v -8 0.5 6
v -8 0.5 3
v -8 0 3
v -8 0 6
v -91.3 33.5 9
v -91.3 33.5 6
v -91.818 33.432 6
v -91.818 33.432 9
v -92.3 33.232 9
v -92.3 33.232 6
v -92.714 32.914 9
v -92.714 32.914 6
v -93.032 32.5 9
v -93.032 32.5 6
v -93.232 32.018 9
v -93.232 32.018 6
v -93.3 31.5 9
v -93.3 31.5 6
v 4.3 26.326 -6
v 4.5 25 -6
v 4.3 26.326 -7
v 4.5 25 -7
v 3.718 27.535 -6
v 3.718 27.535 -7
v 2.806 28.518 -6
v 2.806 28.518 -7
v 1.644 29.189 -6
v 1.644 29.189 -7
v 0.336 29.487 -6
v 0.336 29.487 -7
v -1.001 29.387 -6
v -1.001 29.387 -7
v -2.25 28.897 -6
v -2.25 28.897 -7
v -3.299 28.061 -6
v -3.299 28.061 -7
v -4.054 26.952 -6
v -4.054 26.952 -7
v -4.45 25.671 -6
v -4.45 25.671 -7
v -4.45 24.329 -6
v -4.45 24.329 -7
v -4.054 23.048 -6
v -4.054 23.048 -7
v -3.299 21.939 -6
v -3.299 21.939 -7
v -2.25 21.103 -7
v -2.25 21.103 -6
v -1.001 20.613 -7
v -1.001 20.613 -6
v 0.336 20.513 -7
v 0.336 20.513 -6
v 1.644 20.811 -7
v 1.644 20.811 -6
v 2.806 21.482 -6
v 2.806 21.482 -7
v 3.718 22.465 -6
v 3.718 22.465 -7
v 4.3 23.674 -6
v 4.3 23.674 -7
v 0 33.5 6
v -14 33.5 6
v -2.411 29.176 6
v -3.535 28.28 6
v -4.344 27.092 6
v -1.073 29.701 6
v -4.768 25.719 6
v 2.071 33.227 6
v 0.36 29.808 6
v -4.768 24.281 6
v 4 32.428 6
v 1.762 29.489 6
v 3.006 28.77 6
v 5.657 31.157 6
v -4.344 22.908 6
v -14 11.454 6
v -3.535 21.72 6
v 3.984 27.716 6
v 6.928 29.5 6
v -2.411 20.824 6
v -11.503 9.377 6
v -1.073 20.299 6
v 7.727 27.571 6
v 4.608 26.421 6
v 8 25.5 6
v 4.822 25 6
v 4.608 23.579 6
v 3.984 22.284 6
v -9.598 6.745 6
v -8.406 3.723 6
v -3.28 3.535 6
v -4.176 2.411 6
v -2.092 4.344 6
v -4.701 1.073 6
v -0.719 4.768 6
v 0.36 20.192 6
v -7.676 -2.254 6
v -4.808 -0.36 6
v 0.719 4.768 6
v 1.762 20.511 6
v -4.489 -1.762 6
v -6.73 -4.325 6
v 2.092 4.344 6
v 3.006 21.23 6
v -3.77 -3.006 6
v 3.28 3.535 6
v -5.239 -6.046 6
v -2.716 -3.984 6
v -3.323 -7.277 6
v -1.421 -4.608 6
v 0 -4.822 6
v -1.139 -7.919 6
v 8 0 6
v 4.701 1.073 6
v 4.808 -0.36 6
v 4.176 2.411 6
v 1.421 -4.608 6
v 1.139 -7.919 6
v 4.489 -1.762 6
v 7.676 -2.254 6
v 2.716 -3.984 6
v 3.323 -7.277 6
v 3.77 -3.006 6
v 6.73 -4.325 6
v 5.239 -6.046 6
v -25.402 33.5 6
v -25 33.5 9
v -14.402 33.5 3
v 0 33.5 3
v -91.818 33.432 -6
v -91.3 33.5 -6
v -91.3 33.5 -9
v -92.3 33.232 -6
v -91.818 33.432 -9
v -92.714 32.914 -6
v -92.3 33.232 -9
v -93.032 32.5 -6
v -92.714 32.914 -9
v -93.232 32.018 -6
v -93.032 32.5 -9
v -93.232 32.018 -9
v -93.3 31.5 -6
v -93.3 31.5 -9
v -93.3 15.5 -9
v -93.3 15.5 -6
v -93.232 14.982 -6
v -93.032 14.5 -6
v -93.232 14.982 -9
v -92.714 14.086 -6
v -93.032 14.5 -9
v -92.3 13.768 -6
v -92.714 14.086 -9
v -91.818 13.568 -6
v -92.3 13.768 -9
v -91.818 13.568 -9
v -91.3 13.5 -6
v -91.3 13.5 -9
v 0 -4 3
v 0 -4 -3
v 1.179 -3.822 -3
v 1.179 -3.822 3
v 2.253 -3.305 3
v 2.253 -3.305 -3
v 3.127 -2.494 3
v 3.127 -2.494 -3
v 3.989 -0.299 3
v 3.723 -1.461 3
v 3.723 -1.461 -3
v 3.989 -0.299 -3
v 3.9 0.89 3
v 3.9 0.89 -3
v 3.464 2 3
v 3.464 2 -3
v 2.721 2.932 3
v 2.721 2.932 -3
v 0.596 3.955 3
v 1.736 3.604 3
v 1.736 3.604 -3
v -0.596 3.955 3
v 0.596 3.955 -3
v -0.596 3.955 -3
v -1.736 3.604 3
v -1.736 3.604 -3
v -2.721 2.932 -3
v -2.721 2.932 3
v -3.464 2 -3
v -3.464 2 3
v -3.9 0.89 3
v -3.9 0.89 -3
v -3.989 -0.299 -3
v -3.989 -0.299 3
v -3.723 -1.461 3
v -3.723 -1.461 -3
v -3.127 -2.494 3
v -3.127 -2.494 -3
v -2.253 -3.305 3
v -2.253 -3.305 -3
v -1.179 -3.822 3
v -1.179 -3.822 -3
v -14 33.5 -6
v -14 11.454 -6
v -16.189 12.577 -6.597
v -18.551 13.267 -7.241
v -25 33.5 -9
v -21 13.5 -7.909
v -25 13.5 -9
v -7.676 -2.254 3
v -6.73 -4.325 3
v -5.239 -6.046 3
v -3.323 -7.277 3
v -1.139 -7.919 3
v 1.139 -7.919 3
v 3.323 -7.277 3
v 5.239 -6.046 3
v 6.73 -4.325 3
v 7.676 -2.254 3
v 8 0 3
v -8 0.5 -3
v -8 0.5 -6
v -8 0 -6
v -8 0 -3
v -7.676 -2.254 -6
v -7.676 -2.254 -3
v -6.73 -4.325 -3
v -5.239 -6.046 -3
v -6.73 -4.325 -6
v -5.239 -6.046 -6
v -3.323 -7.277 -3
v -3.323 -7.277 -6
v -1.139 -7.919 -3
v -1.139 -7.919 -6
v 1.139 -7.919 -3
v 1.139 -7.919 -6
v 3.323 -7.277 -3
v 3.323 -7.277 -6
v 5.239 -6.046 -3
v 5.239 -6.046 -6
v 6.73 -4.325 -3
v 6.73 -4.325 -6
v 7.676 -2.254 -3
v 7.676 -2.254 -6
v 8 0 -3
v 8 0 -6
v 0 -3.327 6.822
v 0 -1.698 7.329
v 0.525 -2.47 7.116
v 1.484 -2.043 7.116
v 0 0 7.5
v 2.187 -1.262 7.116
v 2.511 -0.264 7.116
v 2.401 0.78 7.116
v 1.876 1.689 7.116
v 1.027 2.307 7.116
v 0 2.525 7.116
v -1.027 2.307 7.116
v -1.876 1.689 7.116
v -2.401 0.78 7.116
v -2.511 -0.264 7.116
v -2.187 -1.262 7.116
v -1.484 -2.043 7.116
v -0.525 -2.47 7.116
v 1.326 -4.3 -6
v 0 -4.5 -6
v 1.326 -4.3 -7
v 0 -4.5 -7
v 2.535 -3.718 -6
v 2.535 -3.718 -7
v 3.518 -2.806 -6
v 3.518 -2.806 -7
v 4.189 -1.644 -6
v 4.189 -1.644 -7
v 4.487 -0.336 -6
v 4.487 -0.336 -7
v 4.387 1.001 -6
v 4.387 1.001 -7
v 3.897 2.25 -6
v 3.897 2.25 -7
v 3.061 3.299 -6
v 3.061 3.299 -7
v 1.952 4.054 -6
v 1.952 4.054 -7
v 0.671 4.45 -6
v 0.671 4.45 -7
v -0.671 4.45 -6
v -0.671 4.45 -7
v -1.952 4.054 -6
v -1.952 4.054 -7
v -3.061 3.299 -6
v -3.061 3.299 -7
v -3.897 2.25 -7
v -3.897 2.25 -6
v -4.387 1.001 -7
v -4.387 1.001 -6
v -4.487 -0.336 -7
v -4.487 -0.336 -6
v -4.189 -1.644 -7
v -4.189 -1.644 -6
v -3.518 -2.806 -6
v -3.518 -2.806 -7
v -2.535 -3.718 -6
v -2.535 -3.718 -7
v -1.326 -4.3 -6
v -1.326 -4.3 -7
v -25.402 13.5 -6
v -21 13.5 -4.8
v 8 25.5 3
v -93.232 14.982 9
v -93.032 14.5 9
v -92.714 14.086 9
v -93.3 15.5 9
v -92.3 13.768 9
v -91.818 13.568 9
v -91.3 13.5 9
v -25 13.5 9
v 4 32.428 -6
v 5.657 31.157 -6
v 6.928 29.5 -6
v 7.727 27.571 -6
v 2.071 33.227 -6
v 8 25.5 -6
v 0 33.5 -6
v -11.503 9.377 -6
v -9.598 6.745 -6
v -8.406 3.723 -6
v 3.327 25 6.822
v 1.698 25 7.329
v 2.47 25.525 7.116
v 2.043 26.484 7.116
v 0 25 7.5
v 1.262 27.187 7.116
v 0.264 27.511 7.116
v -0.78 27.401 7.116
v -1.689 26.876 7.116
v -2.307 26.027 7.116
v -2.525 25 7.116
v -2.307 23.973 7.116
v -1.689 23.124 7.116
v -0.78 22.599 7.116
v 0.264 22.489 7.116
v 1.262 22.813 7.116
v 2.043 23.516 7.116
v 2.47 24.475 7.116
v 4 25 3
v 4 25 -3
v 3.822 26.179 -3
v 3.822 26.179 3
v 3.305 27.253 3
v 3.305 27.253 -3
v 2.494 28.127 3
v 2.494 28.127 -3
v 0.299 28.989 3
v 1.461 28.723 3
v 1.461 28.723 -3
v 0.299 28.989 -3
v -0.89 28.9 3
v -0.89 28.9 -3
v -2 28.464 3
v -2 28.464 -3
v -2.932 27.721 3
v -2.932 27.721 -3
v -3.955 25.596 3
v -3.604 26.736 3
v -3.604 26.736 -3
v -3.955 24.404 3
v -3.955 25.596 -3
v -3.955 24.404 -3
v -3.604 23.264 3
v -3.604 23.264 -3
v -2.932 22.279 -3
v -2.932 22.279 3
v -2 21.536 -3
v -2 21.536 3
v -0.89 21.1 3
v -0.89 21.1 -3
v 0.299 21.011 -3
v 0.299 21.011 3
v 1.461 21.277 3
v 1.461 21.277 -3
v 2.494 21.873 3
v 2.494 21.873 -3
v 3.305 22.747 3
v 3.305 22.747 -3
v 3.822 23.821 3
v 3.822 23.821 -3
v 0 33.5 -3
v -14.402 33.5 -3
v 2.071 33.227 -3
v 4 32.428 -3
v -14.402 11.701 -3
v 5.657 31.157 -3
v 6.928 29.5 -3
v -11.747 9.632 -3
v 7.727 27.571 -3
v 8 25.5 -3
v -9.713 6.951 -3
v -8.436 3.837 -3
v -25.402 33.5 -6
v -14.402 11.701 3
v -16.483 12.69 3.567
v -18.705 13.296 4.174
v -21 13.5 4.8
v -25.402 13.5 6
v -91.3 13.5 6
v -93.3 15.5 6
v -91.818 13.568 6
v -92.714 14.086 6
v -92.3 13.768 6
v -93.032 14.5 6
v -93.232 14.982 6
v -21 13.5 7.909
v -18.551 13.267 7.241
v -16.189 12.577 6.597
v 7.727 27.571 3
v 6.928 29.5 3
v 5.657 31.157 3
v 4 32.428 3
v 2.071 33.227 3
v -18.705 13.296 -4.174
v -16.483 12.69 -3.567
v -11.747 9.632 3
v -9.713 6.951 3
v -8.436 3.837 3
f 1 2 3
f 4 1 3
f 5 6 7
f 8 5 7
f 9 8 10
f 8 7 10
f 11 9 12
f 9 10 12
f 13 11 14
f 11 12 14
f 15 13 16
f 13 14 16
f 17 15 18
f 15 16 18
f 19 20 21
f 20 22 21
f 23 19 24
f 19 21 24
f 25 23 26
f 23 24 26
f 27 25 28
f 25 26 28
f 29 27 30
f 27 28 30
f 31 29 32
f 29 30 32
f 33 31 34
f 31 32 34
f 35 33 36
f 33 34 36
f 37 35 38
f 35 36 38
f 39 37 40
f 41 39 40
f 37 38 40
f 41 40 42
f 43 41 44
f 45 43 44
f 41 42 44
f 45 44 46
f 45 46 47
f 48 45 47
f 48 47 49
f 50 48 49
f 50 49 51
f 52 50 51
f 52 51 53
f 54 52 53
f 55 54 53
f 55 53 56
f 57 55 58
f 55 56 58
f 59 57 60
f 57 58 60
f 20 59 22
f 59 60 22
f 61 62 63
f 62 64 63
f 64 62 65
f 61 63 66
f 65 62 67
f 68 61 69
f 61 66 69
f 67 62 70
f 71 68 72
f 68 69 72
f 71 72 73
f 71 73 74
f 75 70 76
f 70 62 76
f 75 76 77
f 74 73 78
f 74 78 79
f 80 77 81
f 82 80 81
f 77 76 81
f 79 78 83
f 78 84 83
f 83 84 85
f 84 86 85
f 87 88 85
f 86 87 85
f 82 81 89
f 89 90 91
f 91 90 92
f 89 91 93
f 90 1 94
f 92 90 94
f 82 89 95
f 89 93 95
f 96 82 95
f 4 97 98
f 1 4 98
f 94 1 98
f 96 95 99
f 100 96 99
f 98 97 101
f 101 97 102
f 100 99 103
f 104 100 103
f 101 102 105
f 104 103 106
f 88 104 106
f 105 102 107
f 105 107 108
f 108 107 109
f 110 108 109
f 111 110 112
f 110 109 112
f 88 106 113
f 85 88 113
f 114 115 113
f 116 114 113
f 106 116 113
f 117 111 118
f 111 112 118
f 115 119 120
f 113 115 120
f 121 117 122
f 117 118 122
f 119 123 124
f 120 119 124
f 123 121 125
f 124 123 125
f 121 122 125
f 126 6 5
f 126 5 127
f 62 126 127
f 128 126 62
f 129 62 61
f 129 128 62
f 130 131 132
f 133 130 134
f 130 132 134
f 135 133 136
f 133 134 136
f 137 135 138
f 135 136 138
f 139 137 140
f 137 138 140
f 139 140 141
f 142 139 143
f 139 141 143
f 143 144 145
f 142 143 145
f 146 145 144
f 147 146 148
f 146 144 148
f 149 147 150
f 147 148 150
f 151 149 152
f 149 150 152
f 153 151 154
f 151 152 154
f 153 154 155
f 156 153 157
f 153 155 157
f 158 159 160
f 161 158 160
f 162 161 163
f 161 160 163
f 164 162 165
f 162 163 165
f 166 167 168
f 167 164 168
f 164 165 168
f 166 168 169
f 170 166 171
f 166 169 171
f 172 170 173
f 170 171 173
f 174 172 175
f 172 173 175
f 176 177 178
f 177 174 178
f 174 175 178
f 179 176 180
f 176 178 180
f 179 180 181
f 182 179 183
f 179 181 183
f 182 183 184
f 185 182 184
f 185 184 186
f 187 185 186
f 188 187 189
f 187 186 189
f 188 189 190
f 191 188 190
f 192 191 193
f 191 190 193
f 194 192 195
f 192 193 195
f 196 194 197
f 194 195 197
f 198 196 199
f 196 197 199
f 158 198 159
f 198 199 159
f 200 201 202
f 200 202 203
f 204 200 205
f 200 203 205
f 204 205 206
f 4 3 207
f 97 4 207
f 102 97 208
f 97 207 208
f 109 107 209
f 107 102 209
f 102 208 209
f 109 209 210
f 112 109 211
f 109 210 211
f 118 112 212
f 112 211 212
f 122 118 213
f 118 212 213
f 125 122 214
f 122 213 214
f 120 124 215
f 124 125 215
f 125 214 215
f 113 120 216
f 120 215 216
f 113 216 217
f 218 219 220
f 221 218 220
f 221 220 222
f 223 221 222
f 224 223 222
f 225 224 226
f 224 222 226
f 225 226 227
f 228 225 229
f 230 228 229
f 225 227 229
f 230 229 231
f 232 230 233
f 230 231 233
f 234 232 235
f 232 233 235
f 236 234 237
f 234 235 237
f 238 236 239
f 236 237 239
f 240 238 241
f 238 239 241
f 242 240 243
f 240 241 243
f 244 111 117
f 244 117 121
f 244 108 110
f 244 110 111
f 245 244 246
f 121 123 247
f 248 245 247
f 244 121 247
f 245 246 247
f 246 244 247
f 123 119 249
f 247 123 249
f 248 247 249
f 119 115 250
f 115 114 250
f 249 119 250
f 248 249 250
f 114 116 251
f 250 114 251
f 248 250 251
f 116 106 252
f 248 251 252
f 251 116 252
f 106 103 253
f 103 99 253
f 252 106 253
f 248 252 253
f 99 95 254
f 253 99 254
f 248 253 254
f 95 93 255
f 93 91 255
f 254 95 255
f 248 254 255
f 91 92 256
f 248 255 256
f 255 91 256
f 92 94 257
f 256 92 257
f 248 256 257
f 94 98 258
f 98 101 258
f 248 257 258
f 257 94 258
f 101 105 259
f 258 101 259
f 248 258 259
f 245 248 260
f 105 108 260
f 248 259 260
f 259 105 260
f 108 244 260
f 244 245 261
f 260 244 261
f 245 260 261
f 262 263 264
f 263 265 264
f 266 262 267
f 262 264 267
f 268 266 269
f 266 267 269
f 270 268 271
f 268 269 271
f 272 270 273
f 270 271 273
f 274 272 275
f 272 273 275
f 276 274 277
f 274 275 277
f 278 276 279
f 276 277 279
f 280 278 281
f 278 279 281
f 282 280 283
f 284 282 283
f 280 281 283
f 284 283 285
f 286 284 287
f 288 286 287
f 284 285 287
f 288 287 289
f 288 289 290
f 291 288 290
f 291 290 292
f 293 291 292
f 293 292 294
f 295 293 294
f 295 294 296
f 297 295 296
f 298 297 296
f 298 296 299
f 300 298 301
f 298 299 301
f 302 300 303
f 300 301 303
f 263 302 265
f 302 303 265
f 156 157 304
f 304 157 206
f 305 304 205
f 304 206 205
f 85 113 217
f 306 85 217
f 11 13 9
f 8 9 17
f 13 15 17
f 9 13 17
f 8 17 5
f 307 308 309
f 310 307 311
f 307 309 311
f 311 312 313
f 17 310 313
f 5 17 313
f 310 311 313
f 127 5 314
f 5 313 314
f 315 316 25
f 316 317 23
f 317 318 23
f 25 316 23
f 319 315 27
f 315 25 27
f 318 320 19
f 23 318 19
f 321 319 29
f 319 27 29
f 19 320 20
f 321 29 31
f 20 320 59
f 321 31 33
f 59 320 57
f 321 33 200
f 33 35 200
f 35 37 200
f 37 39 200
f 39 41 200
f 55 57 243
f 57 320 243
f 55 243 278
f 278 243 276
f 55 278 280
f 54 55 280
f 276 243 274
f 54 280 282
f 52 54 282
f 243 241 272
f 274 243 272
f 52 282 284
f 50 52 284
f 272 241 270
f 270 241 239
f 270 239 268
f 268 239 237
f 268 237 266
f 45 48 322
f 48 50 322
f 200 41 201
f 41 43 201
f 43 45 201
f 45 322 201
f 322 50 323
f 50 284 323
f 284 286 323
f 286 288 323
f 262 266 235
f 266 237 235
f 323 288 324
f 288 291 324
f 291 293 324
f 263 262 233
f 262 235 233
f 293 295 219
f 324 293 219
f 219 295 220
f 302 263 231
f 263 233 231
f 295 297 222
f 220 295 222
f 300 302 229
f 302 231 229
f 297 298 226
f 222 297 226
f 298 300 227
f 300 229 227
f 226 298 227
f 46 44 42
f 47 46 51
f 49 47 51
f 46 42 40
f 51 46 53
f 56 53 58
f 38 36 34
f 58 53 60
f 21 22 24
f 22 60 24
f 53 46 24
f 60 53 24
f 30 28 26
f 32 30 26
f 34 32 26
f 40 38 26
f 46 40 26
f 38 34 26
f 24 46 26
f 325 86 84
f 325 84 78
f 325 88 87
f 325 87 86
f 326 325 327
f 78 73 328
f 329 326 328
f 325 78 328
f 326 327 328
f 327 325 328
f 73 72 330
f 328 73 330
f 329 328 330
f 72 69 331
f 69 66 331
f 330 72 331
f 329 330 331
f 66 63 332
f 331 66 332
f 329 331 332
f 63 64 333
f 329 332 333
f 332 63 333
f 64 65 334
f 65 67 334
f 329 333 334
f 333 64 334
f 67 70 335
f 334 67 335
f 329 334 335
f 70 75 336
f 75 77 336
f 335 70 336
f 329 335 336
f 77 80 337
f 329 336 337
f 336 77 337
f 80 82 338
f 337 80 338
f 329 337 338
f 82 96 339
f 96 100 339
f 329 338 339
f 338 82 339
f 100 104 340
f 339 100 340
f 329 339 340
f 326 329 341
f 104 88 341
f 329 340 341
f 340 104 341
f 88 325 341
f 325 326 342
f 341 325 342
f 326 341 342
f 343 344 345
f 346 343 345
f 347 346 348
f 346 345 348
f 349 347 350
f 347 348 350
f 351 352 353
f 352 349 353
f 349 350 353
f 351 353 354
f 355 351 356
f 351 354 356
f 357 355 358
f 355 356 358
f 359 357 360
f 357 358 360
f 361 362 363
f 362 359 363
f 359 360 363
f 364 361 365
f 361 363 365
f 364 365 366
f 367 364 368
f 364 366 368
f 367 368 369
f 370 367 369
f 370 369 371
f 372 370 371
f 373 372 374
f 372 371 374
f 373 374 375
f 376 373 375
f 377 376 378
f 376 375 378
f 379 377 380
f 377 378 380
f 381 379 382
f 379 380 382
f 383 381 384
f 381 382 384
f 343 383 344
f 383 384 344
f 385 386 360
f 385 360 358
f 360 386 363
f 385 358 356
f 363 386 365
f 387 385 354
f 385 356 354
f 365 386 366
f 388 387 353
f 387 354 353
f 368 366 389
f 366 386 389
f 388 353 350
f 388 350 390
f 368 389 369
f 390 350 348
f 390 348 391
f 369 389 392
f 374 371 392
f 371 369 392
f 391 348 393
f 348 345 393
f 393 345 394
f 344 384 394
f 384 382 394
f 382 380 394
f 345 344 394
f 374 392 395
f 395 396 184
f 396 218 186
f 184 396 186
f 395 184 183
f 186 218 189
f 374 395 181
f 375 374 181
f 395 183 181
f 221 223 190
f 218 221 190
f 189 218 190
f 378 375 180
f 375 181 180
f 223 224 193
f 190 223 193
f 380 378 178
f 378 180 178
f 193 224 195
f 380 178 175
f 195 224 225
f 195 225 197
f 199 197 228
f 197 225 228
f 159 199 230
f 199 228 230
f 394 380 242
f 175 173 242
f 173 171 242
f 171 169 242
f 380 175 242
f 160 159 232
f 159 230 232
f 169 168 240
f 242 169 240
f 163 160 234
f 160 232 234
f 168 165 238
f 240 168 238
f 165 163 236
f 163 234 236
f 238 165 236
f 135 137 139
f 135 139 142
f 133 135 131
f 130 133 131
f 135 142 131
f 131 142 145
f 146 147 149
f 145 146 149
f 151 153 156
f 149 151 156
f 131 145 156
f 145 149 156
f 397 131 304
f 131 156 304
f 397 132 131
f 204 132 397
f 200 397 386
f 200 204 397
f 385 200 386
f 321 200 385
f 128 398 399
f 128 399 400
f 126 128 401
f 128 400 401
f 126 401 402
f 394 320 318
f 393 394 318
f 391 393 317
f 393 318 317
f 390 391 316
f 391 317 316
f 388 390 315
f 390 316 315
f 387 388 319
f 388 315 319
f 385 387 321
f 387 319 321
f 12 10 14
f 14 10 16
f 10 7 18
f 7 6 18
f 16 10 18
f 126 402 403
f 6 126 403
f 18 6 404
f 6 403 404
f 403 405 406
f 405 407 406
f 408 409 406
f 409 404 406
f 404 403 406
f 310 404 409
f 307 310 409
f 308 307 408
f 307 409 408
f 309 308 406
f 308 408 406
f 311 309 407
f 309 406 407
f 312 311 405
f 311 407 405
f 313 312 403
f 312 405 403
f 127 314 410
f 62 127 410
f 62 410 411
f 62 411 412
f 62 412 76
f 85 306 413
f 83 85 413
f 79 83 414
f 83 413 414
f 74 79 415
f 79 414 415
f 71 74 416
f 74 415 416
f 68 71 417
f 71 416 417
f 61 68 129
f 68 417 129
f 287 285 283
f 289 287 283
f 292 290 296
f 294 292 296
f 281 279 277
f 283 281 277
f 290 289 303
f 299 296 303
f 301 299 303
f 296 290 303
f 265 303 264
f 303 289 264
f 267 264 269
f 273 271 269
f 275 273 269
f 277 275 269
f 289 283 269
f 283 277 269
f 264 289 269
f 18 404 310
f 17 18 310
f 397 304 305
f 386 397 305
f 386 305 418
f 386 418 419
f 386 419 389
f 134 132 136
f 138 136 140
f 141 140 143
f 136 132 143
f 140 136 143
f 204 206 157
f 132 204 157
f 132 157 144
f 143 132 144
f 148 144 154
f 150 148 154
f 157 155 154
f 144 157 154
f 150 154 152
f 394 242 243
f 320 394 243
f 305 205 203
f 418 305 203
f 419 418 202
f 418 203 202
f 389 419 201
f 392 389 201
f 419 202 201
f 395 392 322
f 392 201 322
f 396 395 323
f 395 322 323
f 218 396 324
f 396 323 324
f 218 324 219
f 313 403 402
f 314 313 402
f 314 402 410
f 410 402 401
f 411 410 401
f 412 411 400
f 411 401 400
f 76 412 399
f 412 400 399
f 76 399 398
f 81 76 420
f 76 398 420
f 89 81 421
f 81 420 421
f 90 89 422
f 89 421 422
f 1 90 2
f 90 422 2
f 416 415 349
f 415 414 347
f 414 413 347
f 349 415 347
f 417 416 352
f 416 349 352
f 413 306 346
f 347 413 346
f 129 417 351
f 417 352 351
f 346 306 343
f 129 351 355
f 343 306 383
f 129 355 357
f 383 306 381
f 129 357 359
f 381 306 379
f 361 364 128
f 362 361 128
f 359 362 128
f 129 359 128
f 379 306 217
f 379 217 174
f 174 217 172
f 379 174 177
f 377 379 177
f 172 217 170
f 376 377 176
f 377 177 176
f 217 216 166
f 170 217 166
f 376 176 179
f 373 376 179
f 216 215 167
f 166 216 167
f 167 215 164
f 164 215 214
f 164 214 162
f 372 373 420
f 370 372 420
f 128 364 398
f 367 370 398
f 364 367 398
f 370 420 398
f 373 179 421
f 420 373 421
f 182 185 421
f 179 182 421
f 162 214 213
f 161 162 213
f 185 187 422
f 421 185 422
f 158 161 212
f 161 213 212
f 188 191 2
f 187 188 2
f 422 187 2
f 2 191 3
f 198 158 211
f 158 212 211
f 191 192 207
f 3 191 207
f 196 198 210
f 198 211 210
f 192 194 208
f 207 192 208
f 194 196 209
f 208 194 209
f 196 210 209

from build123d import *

# Parameters (mm, degrees)
EXTRUDE_1_DEPTH          = 41.5
EXTRUDE_2_DEPTH          = 41.5
CUT_EXTRUDE_1_DEPTH      = 9
CUT_EXTRUDE_1_DEPTH_BACK = 9
SKETCH_5_W               = 311.655321532
SKETCH_5_H               = 249.673450863


with BuildPart() as part:
    # 草图1 → 凸台-拉伸1 (new body)
    with BuildSketch(Plane(origin=(0, -8, 0), x_dir=(1, 0, 0), z_dir=(0, 1, 0))):
        Polygon((-93.3, -6), (-93.3, -9), (-25, -9), (-14, -6), (8, -6), (8, -3), (-14.401754251, -3), (-25.401754251, -6), align=None)
    extrude(amount=EXTRUDE_1_DEPTH)

    # 草图2 → 旋转1 (revolve)
    with BuildSketch(Plane(origin=(0, 0, 0), x_dir=(0, 0, -1), z_dir=(1, 0, 0))):
        with BuildLine():
            Line((-6, 4.82182538), (-6, 4))
            Line((-6, 4), (6, 4))
            Line((6, 4), (6, 4.5))
            Line((6, 4.5), (7, 4.5))
            Line((7, 4.5), (7, 0))
            Line((7, 0), (-7.5, 0))
            ThreePointArc((-7.5, 0), (-7.11634154, 2.524876235), (-6, 4.82182538))
        make_face()
    revolve(axis=Axis((0, 0, -7), (0, 0, 1)))

    # 草图3 → 旋转2 (revolve)
    with BuildSketch(Plane(origin=(0, 0, 0), x_dir=(0, 0, -1), z_dir=(1, 0, 0))):
        with BuildLine():
            Line((-6, 29.82182538), (-6, 29))
            Line((-6, 29), (6, 29))
            Line((6, 29), (6, 29.5))
            Line((6, 29.5), (7, 29.5))
            Line((7, 29.5), (7, 25))
            Line((7, 25), (-7.5, 25))
            ThreePointArc((-7.5, 25), (-7.11634154, 27.524876235), (-6, 29.82182538))
        make_face()
    revolve(axis=Axis((0, 25, -7), (0, 0, 1)))

    # 草图4 → 凸台-拉伸2 (add)
    with BuildSketch(Plane(origin=(0, -8, 0), x_dir=(1, 0, 0), z_dir=(0, 1, 0))):
        Polygon((-93.3, 6), (-25.401754251, 6), (-14.401754251, 3), (8, 3), (8, 6), (-14, 6), (-25, 9), (-93.3, 9), align=None)
    extrude(amount=EXTRUDE_2_DEPTH)

    # 草图5 → 切除-拉伸1 (cut, two sides: drawn at the far end of the back side and taken through both)
    with BuildSketch(Plane.XY.offset(-CUT_EXTRUDE_1_DEPTH_BACK)):
        with Locations((-43.959476141, 21.043348893)):
            Rectangle(SKETCH_5_W, SKETCH_5_H)
        with BuildLine():
            Line((-91.3, 13.5), (-21, 13.5))
            ThreePointArc((-21, 13.5), (-11.807611845, 9.692388155), (-8, 0.5))
            Line((-8, 0.5), (-8, 0))
            ThreePointArc((-8, 0), (0, -8), (8, 0))
            Line((8, 0), (8, 25.5))
            ThreePointArc((8, 25.5), (5.656854249, 31.156854249), (0, 33.5))
            Line((0, 33.5), (-91.3, 33.5))
            ThreePointArc((-91.3, 33.5), (-92.714213562, 32.914213562), (-93.3, 31.5))
            Line((-93.3, 31.5), (-93.3, 15.5))
            ThreePointArc((-93.3, 15.5), (-92.714213562, 14.085786438), (-91.3, 13.5))
        make_face(mode=Mode.SUBTRACT)
    extrude(amount=CUT_EXTRUDE_1_DEPTH + CUT_EXTRUDE_1_DEPTH_BACK, mode=Mode.SUBTRACT)


solid = part.part
